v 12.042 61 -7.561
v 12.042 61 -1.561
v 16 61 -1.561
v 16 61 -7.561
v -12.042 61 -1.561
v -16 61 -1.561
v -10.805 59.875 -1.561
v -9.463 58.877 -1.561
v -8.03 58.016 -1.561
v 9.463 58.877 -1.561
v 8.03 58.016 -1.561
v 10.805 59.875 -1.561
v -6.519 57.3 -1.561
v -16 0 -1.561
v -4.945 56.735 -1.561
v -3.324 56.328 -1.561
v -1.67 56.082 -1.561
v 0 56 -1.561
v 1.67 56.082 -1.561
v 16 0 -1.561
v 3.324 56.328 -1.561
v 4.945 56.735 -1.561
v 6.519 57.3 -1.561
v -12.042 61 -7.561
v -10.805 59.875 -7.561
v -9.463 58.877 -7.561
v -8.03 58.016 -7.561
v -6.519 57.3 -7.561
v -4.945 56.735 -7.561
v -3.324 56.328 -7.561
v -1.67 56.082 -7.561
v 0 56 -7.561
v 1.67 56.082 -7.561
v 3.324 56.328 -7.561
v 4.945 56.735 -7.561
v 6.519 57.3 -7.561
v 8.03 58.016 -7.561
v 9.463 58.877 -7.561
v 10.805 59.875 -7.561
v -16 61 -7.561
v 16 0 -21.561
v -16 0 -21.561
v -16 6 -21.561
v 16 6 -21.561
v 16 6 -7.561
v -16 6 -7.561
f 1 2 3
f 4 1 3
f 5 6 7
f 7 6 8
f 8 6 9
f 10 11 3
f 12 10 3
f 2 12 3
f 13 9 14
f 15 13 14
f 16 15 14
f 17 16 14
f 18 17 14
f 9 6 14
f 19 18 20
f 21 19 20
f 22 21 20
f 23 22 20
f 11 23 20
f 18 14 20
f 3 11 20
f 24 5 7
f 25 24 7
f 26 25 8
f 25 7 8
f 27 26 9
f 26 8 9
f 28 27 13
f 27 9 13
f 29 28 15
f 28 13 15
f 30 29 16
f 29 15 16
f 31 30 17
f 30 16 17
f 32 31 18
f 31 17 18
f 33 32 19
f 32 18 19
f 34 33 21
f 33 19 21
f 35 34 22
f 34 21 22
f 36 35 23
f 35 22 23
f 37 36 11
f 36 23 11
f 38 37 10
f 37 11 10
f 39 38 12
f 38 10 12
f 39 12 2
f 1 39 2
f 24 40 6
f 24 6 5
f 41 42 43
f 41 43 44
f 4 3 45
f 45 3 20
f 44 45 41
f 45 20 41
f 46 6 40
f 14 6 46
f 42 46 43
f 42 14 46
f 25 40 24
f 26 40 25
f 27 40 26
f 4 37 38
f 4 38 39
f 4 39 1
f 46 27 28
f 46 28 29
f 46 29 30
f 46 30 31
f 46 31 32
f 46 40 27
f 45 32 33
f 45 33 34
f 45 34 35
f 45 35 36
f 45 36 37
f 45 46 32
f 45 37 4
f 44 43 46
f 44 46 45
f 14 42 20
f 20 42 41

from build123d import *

# Parameters (mm, degrees)
SKETCH_1_W          = 32
SKETCH_1_H          = 20
EXTRUDE_1_DEPTH     = 6
SKETCH_2_W          = 32
SKETCH_2_H          = 6
EXTRUDE_2_DEPTH     = 55
SKETCH_3_R          = 17
CUT_EXTRUDE_1_DEPTH = 55


with BuildPart() as part:
    # 草图1 → 凸台-拉伸1 (new body)
    with BuildSketch(Plane(origin=(0, 0, 0), x_dir=(1, 0, 0), z_dir=(0, 1, 0))):
        with Locations((0, 11.560693642)):
            Rectangle(SKETCH_1_W, SKETCH_1_H)
    extrude(amount=EXTRUDE_1_DEPTH)

    # 草图2 → 凸台-拉伸2 (add)
    with BuildSketch(Plane(origin=(0, 6, 0), x_dir=(1, 0, 0), z_dir=(0, 1, 0))):
        with Locations((0, 4.560693642)):
            Rectangle(SKETCH_2_W, SKETCH_2_H)
    extrude(amount=EXTRUDE_2_DEPTH)

    # 草图3 → 切除-拉伸1 (cut)
    with BuildSketch(Plane.XY.offset(-1.560693642)):
        with Locations((0, 73)):
            Circle(SKETCH_3_R)
    extrude(amount=-CUT_EXTRUDE_1_DEPTH, mode=Mode.SUBTRACT)


solid = part.part
